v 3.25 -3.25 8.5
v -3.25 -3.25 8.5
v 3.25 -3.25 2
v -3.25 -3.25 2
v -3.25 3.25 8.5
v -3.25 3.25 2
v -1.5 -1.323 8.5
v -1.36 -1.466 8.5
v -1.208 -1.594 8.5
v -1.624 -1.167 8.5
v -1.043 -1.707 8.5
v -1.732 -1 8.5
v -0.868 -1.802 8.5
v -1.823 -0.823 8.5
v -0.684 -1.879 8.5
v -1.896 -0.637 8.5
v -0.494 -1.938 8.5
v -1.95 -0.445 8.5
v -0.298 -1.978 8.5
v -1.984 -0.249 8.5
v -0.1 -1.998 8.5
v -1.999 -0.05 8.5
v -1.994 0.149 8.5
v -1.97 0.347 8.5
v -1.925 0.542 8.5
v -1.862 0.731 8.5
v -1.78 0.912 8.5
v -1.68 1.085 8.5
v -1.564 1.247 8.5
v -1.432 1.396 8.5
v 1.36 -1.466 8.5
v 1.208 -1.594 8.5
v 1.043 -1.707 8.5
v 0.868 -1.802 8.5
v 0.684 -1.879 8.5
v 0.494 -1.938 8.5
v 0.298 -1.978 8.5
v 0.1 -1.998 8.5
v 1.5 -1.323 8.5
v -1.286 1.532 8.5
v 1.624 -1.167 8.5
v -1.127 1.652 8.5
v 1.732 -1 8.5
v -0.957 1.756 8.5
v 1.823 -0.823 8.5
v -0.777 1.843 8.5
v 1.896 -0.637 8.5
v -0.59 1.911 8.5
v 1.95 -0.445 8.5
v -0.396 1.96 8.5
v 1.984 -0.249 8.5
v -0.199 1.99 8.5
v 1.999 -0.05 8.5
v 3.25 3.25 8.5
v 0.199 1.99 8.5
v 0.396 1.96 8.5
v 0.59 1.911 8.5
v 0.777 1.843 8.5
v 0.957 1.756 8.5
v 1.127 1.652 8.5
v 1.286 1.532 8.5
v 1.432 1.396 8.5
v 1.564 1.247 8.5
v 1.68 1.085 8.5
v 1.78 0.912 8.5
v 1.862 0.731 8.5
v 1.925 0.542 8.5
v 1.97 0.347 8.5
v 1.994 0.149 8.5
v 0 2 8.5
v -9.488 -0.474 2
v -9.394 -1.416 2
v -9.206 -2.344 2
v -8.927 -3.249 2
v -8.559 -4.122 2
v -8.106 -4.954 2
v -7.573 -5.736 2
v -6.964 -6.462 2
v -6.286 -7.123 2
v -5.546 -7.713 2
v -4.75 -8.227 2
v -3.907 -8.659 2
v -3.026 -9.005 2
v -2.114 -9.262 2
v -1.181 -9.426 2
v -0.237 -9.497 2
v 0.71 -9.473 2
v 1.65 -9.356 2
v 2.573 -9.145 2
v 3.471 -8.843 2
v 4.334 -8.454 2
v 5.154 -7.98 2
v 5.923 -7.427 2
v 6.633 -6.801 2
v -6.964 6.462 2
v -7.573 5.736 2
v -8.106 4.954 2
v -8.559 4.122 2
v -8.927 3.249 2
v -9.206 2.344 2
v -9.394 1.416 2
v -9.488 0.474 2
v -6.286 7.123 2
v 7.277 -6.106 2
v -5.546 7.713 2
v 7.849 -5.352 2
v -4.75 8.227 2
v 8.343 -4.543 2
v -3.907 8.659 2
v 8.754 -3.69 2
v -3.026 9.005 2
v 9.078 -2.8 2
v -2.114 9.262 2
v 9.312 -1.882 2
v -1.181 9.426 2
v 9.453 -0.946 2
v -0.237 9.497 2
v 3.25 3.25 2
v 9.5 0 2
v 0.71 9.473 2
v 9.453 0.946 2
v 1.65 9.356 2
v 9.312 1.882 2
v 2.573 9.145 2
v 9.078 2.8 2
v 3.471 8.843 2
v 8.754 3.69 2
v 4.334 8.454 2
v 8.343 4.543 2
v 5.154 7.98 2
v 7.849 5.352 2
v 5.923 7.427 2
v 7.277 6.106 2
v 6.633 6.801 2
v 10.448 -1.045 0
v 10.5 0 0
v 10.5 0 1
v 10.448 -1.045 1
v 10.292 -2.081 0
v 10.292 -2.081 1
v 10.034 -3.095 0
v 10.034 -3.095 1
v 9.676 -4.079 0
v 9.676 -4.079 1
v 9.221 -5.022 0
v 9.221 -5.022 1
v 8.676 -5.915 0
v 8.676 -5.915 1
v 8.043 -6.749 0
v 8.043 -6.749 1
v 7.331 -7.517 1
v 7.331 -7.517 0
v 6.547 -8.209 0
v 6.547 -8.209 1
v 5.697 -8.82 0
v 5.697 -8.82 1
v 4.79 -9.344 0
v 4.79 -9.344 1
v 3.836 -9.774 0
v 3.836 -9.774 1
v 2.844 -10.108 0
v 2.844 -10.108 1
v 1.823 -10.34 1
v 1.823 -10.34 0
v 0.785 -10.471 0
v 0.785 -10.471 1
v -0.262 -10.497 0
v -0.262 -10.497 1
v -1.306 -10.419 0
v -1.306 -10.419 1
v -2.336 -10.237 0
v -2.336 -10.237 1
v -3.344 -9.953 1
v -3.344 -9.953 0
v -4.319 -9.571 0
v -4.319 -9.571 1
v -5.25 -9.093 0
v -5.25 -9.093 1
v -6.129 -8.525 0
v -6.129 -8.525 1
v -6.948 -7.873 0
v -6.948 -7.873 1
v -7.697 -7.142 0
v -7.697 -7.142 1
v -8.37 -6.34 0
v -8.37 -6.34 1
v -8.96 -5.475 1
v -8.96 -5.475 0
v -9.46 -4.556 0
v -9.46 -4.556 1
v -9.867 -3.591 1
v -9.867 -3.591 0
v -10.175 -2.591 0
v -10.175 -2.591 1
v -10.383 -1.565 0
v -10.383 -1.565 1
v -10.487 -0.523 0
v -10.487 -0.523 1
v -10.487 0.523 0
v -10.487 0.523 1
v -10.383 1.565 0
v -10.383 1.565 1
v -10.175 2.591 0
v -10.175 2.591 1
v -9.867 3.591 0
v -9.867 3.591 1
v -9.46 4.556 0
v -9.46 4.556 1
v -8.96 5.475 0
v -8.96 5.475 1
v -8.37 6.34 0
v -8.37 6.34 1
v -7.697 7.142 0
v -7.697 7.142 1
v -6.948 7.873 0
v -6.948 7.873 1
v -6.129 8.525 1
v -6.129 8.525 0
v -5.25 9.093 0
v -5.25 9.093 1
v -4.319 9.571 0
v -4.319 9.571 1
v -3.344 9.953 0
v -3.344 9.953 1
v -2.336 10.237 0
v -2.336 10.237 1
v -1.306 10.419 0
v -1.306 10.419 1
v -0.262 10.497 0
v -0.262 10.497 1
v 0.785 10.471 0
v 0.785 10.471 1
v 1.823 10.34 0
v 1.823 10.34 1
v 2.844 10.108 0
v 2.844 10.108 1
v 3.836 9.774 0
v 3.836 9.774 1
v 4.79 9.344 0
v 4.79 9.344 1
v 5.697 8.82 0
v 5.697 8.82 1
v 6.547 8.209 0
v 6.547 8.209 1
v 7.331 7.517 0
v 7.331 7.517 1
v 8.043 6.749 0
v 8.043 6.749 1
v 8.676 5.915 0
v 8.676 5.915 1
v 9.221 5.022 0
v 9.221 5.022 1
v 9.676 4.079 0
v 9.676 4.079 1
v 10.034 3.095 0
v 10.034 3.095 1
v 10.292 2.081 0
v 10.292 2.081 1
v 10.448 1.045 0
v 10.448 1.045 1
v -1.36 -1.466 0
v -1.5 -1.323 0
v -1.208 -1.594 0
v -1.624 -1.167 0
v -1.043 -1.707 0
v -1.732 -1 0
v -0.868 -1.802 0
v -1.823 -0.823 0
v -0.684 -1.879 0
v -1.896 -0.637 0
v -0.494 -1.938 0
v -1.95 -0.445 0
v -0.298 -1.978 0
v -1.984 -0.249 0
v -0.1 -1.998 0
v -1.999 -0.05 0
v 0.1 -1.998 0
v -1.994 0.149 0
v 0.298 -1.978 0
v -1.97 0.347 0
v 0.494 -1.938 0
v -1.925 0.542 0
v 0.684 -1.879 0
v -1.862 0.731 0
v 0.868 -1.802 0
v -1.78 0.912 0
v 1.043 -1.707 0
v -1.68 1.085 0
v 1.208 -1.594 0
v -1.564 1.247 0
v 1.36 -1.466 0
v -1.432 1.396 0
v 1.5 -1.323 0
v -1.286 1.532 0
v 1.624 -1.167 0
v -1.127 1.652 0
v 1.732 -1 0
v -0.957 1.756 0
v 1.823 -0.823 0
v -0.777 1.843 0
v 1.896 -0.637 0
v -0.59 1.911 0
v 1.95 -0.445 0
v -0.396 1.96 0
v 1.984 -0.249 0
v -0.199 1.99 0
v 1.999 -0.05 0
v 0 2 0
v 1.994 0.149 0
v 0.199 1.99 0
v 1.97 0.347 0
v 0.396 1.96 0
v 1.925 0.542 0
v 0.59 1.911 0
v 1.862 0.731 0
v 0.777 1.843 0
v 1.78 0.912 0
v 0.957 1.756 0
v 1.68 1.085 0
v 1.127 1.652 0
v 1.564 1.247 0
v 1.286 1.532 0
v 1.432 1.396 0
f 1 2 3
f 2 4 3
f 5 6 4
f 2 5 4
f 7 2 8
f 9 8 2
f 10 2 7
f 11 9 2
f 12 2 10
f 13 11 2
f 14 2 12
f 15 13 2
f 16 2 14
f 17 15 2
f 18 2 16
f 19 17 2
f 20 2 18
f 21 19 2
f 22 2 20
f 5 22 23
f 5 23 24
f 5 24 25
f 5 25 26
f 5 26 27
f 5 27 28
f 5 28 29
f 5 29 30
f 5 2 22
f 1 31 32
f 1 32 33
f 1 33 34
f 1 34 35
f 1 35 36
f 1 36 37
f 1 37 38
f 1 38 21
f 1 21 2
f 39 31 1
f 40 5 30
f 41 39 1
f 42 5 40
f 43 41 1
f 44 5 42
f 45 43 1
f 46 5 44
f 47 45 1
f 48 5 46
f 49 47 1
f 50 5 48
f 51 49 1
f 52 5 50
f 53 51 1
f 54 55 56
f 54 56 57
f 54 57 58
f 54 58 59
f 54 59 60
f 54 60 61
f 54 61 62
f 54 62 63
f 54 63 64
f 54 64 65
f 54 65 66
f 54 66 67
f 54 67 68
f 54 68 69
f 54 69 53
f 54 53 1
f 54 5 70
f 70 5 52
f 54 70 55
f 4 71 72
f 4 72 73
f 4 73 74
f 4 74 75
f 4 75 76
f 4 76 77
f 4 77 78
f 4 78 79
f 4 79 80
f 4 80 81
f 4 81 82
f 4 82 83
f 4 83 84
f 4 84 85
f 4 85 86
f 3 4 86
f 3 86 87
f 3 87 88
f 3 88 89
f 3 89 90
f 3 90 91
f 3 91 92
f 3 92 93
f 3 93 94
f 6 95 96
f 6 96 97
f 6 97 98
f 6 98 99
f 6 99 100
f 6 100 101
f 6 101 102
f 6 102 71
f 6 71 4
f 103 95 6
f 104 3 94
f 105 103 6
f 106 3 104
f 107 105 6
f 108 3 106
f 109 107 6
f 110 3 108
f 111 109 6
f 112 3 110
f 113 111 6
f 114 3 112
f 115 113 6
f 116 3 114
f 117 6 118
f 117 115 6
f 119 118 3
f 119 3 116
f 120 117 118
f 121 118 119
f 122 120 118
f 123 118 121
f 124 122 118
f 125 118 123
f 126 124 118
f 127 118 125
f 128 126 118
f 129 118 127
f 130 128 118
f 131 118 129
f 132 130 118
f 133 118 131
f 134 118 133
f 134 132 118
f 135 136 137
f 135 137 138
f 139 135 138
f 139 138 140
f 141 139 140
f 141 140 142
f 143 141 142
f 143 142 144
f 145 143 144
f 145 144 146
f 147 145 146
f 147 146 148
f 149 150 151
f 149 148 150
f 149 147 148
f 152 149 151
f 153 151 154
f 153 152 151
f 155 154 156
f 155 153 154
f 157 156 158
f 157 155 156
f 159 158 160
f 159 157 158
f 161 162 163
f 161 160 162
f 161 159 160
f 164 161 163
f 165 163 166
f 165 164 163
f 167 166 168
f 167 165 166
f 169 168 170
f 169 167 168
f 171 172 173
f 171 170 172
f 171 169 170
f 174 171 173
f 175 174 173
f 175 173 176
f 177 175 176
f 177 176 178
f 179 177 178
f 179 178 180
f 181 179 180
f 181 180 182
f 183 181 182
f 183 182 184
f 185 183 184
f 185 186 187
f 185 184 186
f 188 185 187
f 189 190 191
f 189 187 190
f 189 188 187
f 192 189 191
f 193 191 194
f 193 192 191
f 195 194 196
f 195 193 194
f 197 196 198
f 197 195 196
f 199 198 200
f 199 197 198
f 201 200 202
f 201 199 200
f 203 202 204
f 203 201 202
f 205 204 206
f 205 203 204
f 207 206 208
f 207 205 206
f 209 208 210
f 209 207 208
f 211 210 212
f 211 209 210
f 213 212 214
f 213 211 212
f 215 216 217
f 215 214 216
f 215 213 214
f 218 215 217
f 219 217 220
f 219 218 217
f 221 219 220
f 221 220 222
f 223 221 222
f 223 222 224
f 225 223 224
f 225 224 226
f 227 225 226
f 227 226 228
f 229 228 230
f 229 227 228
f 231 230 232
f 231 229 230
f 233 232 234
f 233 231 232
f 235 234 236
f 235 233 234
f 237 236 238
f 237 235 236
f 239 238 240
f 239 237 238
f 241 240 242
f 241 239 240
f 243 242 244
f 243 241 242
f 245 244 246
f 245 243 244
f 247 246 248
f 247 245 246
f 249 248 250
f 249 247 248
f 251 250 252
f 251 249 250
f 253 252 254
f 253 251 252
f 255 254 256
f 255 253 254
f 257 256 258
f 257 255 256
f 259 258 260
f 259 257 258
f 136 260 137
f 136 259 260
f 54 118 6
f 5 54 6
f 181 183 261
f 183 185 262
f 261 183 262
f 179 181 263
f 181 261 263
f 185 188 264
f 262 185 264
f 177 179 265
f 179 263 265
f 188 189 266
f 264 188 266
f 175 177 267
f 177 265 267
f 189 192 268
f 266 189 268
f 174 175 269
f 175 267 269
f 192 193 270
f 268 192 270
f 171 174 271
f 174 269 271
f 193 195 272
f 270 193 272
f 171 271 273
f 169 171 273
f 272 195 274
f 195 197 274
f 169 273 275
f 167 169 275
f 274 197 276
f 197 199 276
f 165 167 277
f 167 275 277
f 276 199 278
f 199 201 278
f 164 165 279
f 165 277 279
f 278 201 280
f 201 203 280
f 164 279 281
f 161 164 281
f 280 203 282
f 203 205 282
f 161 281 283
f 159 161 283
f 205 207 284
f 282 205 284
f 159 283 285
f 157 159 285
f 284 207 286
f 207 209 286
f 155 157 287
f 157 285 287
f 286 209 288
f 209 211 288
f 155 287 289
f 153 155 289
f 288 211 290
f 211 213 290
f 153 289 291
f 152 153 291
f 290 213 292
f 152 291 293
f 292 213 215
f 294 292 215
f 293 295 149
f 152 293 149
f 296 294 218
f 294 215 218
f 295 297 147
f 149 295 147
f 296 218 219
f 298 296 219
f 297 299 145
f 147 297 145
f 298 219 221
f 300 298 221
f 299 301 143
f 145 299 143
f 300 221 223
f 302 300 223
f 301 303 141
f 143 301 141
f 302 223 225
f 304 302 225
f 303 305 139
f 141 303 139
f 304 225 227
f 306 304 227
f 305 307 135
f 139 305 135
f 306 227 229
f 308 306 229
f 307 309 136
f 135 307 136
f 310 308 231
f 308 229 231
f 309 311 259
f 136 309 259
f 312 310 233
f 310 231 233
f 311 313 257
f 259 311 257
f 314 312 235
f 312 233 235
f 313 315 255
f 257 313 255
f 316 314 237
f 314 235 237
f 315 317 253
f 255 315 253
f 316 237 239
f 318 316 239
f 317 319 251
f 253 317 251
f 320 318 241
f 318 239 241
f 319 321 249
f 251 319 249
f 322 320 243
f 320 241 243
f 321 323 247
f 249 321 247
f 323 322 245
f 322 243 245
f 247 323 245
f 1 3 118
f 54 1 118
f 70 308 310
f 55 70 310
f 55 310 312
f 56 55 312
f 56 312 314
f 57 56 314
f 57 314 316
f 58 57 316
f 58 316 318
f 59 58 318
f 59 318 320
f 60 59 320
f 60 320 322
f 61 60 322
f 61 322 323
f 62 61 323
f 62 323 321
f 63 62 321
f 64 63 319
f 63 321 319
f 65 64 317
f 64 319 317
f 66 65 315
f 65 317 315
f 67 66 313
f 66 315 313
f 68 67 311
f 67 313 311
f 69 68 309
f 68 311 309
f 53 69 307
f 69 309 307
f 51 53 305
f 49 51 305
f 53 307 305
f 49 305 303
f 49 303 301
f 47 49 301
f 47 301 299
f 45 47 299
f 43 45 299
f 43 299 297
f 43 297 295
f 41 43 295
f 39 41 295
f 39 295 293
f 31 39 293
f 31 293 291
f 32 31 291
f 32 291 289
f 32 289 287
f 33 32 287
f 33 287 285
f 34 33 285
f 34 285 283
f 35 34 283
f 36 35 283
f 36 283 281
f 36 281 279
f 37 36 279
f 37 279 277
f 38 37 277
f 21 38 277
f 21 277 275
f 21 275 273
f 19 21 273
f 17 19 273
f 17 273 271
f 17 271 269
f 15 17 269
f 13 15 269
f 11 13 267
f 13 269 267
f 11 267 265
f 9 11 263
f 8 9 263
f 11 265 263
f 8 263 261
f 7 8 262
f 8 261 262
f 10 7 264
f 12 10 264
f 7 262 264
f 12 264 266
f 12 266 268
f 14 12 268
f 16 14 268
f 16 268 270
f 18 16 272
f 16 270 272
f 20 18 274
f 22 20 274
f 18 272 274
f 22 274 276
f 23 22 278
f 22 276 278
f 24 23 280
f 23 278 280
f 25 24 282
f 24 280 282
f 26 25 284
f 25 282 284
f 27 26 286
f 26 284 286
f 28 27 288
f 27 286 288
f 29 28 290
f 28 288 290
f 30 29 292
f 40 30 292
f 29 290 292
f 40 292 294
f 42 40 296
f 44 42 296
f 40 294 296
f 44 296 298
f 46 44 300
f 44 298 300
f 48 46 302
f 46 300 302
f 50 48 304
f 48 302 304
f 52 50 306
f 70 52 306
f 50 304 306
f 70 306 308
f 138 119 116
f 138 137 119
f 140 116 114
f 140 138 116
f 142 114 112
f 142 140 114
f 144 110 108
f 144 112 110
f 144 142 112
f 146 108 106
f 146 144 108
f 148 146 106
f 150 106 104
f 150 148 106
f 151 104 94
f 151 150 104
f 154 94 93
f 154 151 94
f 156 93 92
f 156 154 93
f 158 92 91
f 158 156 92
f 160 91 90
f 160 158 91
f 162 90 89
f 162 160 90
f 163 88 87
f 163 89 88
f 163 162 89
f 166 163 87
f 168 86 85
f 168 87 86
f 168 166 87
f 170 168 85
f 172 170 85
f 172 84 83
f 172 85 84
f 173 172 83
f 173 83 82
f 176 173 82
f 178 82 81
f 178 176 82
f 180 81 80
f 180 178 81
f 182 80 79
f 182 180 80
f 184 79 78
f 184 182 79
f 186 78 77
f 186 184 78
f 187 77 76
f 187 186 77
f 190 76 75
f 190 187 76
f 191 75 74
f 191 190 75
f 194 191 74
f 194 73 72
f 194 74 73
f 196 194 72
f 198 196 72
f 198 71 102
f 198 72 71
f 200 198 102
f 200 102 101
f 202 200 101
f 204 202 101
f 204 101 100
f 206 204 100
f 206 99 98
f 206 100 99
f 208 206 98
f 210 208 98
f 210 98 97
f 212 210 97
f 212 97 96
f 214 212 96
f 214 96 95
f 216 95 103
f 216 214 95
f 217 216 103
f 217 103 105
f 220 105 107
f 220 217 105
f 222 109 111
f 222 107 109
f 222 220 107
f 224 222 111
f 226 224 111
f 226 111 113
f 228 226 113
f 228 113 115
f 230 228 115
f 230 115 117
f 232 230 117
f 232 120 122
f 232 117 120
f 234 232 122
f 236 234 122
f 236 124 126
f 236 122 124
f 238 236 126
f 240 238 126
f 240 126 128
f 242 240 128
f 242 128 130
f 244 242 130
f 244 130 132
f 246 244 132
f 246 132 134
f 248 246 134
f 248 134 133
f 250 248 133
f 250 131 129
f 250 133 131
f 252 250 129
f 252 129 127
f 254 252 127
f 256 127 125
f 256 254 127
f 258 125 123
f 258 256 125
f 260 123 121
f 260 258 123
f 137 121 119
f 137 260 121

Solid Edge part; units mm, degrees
sketch "Sketch1" plane through (0, 0, 0) normal (0, 0, 1) x (1, 0, 0)
  circle A0 centre (0, 0) radius 10.5
extrude "Protrusion1" add sketch "Sketch1" along normal blind 2
sketch "Sketch2" plane through (0, 0, 2) normal (0, 0, 1) x (1, 0, 0)
  line L0 (-3.25, -3.25) -> (3.25, -3.25)
  line L1 (3.25, -3.25) -> (3.25, 3.25)
  line L2 (3.25, 3.25) -> (-3.25, 3.25)
  line L3 (-3.25, 3.25) -> (-3.25, -3.25)
extrude "Extrusionsausprägung_2" add sketch "Sketch2" along normal blind 6.5
chamfer "Fase_1" distance 1 angle 45 1 edges at (-10.5, 0, 2)
hole "Bohrung_1" at (0, 0, 0) direction (0, 0, 1) diameter 4 end through all
